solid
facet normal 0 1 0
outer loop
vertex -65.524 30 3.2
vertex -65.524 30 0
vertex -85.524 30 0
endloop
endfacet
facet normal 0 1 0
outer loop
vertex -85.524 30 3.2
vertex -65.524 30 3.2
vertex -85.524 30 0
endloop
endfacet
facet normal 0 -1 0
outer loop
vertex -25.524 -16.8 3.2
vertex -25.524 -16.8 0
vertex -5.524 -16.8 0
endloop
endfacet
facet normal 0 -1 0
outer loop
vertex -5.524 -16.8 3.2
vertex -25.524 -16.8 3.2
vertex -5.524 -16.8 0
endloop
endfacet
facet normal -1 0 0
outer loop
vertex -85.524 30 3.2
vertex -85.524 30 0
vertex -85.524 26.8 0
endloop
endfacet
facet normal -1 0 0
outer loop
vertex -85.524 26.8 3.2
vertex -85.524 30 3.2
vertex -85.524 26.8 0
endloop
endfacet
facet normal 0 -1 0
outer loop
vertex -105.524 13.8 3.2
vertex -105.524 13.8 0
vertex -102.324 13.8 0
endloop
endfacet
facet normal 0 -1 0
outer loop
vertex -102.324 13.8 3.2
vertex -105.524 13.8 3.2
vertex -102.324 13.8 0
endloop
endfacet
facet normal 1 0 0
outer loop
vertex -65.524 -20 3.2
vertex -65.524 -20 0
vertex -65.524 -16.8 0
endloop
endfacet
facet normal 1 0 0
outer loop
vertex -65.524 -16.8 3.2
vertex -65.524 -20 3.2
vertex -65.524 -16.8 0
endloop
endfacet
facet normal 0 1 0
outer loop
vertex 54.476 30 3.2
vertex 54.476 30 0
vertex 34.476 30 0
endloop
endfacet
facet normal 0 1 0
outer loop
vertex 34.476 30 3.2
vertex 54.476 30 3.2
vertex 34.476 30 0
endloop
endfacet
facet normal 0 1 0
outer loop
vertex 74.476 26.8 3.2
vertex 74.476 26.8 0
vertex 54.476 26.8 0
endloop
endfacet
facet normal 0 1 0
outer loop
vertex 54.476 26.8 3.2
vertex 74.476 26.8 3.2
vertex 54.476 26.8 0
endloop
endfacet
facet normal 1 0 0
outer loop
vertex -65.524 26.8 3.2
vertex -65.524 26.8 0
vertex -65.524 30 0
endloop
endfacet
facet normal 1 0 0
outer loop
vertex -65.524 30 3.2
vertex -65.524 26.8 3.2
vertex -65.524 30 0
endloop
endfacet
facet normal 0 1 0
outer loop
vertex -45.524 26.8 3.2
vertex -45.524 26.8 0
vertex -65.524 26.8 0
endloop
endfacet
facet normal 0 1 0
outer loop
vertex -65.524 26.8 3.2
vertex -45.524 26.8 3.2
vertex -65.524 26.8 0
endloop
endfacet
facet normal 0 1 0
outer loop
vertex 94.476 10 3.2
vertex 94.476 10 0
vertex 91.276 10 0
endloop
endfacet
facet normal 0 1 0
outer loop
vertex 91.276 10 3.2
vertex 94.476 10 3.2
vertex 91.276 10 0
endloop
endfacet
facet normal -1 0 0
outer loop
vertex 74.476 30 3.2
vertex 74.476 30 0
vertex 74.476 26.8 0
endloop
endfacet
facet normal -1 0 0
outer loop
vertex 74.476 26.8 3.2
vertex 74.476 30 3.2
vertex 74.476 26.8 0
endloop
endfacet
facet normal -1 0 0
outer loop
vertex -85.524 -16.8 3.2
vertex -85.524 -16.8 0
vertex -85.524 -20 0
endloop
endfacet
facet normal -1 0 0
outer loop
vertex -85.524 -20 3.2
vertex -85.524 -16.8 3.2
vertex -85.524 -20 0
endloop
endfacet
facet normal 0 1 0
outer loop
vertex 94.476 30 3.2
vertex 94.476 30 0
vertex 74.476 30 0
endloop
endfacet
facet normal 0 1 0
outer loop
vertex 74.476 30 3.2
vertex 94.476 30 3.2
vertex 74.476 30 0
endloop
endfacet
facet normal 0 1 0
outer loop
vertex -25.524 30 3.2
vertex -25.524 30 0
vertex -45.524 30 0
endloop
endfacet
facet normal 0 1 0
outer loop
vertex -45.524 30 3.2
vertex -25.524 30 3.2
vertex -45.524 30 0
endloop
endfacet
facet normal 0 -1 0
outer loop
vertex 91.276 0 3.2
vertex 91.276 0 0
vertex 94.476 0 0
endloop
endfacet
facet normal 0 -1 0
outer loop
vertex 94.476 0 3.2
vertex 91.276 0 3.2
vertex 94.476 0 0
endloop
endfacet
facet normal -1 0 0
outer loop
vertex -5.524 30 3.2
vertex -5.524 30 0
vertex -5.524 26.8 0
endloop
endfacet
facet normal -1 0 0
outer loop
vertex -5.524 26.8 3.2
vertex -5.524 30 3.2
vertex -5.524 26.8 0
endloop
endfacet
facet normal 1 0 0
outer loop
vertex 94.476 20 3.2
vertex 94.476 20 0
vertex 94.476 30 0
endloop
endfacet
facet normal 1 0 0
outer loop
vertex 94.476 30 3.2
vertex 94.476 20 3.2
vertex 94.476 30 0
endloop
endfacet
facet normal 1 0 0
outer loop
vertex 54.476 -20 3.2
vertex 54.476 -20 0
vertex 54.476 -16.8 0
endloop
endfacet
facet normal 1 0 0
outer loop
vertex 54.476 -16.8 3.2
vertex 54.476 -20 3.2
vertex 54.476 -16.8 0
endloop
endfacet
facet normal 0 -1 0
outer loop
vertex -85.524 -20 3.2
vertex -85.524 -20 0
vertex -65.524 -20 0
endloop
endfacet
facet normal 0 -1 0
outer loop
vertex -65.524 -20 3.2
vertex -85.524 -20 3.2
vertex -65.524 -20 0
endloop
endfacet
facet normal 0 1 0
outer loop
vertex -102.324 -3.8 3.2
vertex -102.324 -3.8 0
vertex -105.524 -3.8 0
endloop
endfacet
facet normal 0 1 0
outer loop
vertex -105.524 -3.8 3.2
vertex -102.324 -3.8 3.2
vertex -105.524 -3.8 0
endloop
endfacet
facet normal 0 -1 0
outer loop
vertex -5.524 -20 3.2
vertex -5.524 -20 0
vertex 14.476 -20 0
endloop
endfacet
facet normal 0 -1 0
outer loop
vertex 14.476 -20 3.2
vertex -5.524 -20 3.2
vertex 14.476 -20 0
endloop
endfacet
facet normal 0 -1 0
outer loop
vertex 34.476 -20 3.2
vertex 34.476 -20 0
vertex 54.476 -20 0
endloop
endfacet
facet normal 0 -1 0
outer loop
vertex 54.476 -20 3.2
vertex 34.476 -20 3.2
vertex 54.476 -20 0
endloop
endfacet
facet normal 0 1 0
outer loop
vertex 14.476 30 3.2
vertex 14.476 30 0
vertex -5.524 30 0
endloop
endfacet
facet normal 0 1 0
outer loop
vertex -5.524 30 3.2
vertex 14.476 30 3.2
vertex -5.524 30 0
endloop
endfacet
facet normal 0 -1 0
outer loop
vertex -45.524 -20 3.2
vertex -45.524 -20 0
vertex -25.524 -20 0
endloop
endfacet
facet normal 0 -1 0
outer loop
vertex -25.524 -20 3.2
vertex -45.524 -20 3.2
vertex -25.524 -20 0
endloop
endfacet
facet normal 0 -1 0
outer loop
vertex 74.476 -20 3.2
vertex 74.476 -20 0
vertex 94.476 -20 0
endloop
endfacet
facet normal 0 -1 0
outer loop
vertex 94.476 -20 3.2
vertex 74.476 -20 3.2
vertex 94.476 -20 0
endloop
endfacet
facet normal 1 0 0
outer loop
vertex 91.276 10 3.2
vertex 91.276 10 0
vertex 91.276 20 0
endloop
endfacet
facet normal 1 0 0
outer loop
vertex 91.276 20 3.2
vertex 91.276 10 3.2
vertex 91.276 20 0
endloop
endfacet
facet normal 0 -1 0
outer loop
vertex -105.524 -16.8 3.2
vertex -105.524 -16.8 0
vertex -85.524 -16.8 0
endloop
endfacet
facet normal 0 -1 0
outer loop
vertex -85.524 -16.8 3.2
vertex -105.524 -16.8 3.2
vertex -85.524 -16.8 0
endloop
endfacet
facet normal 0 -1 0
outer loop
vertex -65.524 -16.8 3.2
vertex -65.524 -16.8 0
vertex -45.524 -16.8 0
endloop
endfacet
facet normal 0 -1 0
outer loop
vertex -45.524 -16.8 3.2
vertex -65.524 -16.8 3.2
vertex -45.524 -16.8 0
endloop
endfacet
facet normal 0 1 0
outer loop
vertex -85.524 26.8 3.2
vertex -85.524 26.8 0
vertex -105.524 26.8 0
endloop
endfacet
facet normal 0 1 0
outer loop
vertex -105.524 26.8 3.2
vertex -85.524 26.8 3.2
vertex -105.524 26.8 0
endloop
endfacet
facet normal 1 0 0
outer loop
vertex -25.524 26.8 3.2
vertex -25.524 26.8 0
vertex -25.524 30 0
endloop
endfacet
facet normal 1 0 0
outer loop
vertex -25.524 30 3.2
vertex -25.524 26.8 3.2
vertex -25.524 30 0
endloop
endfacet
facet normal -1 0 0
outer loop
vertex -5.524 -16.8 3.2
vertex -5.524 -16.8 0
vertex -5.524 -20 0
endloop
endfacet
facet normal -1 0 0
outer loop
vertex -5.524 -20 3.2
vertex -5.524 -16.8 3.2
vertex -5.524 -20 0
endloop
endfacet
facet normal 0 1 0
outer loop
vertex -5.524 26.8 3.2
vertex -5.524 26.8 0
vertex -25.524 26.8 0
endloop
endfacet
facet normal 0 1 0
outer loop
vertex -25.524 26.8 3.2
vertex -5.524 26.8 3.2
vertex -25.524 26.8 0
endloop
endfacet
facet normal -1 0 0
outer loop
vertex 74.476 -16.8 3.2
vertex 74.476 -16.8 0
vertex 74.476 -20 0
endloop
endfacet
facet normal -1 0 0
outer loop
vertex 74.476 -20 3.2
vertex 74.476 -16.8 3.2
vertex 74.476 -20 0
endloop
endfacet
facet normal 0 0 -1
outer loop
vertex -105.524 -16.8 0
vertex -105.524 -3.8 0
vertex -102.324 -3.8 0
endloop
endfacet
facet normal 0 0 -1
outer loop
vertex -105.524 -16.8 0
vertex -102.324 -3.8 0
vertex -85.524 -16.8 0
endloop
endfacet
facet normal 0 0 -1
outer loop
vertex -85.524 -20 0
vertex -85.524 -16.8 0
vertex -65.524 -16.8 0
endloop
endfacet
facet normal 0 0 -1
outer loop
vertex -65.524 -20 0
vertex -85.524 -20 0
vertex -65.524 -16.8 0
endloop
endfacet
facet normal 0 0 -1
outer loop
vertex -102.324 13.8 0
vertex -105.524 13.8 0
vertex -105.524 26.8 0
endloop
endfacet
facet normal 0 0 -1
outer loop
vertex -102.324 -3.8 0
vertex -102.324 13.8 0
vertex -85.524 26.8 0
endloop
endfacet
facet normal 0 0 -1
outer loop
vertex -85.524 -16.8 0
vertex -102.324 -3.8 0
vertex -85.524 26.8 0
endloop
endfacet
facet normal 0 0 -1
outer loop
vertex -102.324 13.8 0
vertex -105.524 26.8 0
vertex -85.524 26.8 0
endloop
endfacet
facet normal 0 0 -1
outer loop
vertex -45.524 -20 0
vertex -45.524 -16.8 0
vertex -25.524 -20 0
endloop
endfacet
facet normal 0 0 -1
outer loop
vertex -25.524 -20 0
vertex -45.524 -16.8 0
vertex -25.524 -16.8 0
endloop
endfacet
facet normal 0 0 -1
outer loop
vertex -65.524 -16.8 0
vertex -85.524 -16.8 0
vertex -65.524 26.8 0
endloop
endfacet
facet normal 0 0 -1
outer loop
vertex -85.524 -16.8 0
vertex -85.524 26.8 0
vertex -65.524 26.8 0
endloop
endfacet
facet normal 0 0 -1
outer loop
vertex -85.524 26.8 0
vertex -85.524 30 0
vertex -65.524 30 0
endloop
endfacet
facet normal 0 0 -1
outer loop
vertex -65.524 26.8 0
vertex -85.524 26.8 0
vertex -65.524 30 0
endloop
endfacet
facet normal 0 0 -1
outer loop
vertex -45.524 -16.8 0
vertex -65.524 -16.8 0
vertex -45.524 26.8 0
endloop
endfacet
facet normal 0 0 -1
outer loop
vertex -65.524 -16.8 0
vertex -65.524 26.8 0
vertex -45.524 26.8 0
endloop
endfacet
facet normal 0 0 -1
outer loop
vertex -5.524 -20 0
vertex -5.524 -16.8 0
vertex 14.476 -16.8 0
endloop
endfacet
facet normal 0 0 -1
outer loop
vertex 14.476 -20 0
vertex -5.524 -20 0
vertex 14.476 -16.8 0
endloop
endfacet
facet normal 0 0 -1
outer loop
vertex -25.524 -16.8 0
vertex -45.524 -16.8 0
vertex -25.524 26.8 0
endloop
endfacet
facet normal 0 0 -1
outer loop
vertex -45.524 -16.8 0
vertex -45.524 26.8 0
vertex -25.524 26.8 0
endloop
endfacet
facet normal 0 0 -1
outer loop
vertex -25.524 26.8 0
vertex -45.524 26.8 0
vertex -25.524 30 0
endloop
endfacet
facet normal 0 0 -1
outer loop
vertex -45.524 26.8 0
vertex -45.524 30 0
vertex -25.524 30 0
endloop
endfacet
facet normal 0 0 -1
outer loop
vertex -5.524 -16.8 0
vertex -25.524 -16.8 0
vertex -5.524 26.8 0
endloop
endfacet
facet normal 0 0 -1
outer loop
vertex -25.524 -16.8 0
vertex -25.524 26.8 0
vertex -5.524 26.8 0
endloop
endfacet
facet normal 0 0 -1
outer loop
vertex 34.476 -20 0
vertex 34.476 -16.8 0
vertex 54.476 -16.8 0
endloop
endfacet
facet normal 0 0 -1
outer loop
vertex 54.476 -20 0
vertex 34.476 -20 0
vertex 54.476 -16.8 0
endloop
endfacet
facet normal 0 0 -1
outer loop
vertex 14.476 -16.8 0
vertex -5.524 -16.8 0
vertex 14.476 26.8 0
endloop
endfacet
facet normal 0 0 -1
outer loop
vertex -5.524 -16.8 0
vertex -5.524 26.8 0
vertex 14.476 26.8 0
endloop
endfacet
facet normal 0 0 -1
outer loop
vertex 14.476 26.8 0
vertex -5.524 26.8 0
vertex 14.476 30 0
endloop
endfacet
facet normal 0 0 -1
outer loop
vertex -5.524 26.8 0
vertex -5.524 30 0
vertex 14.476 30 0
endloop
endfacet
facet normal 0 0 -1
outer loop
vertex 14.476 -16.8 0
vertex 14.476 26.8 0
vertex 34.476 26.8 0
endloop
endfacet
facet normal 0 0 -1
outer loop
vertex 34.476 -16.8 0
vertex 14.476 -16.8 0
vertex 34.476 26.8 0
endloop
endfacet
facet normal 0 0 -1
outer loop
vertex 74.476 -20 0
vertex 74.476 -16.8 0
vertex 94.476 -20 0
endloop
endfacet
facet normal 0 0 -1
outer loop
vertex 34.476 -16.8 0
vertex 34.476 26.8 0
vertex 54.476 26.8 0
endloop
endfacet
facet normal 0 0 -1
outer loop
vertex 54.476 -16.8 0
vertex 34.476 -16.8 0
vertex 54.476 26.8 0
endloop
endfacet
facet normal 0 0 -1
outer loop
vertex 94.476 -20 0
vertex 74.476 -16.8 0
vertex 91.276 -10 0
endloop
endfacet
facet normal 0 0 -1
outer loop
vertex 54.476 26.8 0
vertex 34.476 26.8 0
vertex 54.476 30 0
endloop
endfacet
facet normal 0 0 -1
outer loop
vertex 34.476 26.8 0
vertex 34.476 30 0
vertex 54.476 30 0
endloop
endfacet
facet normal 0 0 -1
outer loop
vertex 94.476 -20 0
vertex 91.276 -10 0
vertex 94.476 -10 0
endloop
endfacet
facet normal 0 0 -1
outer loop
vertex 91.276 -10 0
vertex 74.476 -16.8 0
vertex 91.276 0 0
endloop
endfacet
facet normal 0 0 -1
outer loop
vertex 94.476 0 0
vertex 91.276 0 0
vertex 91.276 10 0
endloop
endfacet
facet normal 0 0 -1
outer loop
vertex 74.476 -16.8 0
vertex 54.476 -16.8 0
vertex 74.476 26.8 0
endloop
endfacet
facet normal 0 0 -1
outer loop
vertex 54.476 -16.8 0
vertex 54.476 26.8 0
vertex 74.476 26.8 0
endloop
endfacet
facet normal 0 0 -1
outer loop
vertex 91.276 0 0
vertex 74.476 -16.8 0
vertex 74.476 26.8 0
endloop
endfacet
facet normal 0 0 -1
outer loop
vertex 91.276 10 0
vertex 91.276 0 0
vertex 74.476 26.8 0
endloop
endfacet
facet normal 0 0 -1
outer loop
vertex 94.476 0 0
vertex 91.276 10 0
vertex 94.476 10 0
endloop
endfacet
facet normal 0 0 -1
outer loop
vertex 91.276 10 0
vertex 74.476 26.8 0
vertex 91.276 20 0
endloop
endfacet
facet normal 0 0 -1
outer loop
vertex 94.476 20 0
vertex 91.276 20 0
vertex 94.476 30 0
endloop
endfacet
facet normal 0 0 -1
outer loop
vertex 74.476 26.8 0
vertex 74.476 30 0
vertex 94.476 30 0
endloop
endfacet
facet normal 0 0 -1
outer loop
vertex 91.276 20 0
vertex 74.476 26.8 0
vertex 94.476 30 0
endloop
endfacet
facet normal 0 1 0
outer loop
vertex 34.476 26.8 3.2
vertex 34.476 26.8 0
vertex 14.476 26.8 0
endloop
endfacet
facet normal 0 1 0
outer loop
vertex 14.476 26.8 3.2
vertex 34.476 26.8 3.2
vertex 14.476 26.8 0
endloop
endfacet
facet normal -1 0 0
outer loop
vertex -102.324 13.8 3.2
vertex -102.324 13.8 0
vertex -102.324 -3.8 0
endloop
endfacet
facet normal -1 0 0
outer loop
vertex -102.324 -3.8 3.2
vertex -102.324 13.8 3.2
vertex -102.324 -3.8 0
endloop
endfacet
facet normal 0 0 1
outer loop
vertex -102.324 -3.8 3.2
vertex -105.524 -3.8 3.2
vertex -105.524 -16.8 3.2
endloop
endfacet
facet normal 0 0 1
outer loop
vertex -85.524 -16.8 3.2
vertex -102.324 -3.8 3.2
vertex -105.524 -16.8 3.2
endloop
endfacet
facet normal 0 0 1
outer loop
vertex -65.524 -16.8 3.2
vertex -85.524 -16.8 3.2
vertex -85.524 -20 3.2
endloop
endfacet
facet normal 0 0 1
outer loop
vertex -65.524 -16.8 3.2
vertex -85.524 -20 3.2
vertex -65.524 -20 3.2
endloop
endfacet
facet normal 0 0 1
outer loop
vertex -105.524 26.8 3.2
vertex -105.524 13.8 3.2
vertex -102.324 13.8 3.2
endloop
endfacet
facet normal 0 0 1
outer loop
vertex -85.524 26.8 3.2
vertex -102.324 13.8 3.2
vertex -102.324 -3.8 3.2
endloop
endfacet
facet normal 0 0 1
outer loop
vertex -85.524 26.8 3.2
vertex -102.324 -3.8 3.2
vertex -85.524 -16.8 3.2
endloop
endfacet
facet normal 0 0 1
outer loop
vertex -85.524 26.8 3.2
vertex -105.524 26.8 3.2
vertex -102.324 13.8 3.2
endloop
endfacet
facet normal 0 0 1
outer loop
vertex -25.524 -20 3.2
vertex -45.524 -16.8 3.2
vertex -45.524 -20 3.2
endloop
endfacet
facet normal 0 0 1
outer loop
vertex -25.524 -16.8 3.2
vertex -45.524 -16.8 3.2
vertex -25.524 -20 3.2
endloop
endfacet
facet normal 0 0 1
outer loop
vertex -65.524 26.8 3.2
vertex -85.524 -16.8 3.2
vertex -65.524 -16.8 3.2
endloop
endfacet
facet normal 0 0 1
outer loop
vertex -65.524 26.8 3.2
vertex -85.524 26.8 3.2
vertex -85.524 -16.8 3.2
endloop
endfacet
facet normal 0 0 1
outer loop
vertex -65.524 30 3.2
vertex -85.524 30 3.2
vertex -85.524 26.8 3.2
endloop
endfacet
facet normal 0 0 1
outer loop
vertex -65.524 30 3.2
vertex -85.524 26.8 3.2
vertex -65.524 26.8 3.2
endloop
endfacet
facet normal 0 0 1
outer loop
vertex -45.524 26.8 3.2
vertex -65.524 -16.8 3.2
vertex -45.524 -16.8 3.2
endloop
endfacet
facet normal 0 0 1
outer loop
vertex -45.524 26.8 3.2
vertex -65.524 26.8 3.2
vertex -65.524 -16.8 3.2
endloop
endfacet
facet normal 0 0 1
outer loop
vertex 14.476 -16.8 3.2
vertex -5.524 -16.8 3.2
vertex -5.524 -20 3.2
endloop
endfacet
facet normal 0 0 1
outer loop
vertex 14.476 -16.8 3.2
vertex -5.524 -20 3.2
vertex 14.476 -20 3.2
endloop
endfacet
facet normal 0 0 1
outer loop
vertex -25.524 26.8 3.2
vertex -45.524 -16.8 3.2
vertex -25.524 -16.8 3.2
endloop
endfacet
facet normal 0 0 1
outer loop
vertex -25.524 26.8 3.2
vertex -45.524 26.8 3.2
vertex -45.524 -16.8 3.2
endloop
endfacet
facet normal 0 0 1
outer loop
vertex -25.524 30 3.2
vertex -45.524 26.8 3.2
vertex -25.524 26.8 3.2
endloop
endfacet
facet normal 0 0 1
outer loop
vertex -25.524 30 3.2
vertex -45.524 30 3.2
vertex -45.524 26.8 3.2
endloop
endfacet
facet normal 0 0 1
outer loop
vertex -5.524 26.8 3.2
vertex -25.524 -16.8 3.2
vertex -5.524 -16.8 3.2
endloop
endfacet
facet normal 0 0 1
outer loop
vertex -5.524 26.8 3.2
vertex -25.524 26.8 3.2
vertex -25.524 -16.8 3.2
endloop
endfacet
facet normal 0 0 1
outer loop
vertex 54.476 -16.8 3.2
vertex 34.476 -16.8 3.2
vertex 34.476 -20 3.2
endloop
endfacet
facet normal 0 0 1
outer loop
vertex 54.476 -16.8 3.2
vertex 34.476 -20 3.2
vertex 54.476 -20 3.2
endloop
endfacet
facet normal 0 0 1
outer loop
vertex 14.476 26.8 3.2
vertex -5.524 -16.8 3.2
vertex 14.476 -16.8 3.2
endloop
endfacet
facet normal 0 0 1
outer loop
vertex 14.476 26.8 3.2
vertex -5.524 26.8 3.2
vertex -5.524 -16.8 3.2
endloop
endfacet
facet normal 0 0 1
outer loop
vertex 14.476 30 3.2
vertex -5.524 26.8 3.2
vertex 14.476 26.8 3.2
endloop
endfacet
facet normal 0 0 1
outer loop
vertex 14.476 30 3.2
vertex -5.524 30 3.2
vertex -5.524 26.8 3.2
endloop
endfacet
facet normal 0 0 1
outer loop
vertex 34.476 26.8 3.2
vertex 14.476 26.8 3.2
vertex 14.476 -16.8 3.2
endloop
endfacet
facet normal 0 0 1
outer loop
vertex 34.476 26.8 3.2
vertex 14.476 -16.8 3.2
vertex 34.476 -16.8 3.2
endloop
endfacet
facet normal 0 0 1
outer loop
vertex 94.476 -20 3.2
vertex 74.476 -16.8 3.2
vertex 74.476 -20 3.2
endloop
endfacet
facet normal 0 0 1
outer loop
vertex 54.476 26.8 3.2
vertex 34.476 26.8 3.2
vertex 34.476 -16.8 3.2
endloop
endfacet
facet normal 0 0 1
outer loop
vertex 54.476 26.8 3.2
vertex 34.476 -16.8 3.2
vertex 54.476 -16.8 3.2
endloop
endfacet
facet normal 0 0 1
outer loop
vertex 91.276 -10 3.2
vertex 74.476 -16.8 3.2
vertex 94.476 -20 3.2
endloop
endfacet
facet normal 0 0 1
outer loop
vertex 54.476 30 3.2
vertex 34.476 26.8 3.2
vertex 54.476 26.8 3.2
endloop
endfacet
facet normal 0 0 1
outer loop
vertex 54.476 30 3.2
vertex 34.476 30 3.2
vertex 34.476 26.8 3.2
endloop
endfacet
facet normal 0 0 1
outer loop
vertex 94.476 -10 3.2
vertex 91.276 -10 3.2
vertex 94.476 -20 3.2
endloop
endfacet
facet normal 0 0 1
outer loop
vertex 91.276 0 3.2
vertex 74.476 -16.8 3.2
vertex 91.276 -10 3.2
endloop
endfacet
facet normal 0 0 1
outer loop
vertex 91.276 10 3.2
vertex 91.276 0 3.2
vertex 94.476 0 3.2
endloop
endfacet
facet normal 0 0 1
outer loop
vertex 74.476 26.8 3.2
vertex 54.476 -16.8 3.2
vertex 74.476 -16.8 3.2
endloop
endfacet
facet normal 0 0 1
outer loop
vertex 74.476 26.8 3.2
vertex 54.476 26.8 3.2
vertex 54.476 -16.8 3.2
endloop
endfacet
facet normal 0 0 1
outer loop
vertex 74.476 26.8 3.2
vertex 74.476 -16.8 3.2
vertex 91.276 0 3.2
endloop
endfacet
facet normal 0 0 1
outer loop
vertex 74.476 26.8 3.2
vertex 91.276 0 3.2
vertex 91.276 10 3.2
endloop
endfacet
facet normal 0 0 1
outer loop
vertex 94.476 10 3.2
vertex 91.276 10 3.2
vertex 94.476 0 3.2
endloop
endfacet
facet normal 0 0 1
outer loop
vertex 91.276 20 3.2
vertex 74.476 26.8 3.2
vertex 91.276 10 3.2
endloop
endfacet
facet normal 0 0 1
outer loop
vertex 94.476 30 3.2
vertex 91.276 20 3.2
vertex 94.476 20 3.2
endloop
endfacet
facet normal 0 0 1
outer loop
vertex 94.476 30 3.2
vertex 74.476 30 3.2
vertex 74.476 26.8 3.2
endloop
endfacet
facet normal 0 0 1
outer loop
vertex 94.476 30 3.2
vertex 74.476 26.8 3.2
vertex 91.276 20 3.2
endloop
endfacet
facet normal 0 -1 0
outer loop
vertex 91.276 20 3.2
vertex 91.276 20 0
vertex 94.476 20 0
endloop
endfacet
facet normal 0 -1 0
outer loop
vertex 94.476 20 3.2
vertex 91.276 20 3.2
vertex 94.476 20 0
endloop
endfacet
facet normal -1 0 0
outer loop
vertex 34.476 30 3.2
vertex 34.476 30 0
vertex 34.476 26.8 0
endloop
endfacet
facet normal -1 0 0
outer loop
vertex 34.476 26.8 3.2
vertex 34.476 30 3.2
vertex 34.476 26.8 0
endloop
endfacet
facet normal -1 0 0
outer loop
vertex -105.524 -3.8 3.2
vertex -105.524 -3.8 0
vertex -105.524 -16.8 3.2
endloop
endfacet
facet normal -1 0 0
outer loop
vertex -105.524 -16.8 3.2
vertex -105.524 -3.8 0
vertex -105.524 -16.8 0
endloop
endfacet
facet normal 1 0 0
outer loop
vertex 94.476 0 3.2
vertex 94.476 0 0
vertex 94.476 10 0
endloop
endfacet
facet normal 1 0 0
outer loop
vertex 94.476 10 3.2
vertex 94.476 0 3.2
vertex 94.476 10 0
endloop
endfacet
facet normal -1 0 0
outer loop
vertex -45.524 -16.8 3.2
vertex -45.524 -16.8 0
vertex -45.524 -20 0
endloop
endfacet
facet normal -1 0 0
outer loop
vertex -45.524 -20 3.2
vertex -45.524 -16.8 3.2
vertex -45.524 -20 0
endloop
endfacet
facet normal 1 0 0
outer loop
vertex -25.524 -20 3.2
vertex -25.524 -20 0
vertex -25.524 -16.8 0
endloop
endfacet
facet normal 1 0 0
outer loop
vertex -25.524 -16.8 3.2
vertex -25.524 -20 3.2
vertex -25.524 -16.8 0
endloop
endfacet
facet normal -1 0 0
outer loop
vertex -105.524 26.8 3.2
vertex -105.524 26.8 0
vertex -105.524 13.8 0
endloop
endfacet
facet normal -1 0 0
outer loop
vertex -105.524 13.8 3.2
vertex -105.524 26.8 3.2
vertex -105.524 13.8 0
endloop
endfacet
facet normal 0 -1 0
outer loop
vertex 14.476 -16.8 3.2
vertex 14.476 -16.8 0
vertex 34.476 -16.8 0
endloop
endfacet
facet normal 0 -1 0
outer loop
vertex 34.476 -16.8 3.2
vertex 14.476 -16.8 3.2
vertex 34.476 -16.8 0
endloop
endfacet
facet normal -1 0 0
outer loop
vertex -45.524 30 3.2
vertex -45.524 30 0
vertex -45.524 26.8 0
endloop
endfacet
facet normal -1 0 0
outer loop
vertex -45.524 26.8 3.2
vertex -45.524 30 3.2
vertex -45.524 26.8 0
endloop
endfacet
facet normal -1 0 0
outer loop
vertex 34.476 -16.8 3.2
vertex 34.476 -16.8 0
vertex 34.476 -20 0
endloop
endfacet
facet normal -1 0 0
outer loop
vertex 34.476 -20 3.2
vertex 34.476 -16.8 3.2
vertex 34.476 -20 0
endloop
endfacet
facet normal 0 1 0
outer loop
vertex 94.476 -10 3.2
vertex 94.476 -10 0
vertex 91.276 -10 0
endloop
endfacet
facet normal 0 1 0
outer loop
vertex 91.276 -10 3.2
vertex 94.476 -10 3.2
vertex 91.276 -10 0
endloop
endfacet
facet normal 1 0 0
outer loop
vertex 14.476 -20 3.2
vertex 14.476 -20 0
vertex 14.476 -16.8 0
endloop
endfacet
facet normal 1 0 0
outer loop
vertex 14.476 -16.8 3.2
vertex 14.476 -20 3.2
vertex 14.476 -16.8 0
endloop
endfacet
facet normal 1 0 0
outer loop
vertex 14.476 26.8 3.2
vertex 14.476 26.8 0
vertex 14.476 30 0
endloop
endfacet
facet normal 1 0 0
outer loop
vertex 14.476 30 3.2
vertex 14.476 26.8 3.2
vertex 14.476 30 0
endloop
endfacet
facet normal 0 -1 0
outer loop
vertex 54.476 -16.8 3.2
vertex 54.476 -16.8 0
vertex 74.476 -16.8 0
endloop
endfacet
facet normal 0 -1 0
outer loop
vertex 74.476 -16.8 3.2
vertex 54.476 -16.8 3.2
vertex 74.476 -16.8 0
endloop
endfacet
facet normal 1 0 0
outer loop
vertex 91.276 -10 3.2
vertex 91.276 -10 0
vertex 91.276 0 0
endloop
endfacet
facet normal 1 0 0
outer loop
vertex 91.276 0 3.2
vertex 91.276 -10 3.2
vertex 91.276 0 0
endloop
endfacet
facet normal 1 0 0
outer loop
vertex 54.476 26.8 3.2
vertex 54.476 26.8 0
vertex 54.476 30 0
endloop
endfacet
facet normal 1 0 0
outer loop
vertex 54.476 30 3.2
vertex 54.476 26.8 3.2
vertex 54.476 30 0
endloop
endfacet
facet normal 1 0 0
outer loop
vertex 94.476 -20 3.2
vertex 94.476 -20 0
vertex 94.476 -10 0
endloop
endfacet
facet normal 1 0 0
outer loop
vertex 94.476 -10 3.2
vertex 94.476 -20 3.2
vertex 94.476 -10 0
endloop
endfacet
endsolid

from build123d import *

# Parameters (mm, degrees)
F1_DEPTH = 3.2


with BuildPart() as f1:
    # F0 (on Top) → F1 (new body)
    with BuildSketch(Plane.XY):
        Polygon((-65.523831, 30), (-85.523831, 30), (-85.523831, 26.8), (-105.523831, 26.8), (-105.523831, 13.8), (-102.323831, 13.8), (-102.323831, -3.8), (-105.523831, -3.8), (-105.523831, -16.8), (-85.523831, -16.8), (-85.523831, -20), (-65.523831, -20), (-65.523831, -16.8), (-45.523831, -16.8), (-45.523831, -20), (-25.523831, -20), (-25.523831, -16.8), (-5.523831, -16.8), (-5.523831, -20), (14.476169, -20), (14.476169, -16.8), (34.476169, -16.8), (34.476169, -20), (54.476169, -20), (54.476169, -16.8), (74.476169, -16.8), (74.476169, -20), (94.476169, -20), (94.476169, -10), (91.276169, -10), (91.276169, 0), (94.476169, 0), (94.476169, 10), (91.276169, 10), (91.276169, 20), (94.476169, 20), (94.476169, 30), (74.476169, 30), (74.476169, 26.8), (54.476169, 26.8), (54.476169, 30), (34.476169, 30), (34.476169, 26.8), (14.476169, 26.8), (14.476169, 30), (-5.523831, 30), (-5.523831, 26.8), (-25.523831, 26.8), (-25.523831, 30), (-45.523831, 30), (-45.523831, 26.8), (-65.523831, 26.8), align=None)
    extrude(amount=F1_DEPTH)


solid = f1.part
